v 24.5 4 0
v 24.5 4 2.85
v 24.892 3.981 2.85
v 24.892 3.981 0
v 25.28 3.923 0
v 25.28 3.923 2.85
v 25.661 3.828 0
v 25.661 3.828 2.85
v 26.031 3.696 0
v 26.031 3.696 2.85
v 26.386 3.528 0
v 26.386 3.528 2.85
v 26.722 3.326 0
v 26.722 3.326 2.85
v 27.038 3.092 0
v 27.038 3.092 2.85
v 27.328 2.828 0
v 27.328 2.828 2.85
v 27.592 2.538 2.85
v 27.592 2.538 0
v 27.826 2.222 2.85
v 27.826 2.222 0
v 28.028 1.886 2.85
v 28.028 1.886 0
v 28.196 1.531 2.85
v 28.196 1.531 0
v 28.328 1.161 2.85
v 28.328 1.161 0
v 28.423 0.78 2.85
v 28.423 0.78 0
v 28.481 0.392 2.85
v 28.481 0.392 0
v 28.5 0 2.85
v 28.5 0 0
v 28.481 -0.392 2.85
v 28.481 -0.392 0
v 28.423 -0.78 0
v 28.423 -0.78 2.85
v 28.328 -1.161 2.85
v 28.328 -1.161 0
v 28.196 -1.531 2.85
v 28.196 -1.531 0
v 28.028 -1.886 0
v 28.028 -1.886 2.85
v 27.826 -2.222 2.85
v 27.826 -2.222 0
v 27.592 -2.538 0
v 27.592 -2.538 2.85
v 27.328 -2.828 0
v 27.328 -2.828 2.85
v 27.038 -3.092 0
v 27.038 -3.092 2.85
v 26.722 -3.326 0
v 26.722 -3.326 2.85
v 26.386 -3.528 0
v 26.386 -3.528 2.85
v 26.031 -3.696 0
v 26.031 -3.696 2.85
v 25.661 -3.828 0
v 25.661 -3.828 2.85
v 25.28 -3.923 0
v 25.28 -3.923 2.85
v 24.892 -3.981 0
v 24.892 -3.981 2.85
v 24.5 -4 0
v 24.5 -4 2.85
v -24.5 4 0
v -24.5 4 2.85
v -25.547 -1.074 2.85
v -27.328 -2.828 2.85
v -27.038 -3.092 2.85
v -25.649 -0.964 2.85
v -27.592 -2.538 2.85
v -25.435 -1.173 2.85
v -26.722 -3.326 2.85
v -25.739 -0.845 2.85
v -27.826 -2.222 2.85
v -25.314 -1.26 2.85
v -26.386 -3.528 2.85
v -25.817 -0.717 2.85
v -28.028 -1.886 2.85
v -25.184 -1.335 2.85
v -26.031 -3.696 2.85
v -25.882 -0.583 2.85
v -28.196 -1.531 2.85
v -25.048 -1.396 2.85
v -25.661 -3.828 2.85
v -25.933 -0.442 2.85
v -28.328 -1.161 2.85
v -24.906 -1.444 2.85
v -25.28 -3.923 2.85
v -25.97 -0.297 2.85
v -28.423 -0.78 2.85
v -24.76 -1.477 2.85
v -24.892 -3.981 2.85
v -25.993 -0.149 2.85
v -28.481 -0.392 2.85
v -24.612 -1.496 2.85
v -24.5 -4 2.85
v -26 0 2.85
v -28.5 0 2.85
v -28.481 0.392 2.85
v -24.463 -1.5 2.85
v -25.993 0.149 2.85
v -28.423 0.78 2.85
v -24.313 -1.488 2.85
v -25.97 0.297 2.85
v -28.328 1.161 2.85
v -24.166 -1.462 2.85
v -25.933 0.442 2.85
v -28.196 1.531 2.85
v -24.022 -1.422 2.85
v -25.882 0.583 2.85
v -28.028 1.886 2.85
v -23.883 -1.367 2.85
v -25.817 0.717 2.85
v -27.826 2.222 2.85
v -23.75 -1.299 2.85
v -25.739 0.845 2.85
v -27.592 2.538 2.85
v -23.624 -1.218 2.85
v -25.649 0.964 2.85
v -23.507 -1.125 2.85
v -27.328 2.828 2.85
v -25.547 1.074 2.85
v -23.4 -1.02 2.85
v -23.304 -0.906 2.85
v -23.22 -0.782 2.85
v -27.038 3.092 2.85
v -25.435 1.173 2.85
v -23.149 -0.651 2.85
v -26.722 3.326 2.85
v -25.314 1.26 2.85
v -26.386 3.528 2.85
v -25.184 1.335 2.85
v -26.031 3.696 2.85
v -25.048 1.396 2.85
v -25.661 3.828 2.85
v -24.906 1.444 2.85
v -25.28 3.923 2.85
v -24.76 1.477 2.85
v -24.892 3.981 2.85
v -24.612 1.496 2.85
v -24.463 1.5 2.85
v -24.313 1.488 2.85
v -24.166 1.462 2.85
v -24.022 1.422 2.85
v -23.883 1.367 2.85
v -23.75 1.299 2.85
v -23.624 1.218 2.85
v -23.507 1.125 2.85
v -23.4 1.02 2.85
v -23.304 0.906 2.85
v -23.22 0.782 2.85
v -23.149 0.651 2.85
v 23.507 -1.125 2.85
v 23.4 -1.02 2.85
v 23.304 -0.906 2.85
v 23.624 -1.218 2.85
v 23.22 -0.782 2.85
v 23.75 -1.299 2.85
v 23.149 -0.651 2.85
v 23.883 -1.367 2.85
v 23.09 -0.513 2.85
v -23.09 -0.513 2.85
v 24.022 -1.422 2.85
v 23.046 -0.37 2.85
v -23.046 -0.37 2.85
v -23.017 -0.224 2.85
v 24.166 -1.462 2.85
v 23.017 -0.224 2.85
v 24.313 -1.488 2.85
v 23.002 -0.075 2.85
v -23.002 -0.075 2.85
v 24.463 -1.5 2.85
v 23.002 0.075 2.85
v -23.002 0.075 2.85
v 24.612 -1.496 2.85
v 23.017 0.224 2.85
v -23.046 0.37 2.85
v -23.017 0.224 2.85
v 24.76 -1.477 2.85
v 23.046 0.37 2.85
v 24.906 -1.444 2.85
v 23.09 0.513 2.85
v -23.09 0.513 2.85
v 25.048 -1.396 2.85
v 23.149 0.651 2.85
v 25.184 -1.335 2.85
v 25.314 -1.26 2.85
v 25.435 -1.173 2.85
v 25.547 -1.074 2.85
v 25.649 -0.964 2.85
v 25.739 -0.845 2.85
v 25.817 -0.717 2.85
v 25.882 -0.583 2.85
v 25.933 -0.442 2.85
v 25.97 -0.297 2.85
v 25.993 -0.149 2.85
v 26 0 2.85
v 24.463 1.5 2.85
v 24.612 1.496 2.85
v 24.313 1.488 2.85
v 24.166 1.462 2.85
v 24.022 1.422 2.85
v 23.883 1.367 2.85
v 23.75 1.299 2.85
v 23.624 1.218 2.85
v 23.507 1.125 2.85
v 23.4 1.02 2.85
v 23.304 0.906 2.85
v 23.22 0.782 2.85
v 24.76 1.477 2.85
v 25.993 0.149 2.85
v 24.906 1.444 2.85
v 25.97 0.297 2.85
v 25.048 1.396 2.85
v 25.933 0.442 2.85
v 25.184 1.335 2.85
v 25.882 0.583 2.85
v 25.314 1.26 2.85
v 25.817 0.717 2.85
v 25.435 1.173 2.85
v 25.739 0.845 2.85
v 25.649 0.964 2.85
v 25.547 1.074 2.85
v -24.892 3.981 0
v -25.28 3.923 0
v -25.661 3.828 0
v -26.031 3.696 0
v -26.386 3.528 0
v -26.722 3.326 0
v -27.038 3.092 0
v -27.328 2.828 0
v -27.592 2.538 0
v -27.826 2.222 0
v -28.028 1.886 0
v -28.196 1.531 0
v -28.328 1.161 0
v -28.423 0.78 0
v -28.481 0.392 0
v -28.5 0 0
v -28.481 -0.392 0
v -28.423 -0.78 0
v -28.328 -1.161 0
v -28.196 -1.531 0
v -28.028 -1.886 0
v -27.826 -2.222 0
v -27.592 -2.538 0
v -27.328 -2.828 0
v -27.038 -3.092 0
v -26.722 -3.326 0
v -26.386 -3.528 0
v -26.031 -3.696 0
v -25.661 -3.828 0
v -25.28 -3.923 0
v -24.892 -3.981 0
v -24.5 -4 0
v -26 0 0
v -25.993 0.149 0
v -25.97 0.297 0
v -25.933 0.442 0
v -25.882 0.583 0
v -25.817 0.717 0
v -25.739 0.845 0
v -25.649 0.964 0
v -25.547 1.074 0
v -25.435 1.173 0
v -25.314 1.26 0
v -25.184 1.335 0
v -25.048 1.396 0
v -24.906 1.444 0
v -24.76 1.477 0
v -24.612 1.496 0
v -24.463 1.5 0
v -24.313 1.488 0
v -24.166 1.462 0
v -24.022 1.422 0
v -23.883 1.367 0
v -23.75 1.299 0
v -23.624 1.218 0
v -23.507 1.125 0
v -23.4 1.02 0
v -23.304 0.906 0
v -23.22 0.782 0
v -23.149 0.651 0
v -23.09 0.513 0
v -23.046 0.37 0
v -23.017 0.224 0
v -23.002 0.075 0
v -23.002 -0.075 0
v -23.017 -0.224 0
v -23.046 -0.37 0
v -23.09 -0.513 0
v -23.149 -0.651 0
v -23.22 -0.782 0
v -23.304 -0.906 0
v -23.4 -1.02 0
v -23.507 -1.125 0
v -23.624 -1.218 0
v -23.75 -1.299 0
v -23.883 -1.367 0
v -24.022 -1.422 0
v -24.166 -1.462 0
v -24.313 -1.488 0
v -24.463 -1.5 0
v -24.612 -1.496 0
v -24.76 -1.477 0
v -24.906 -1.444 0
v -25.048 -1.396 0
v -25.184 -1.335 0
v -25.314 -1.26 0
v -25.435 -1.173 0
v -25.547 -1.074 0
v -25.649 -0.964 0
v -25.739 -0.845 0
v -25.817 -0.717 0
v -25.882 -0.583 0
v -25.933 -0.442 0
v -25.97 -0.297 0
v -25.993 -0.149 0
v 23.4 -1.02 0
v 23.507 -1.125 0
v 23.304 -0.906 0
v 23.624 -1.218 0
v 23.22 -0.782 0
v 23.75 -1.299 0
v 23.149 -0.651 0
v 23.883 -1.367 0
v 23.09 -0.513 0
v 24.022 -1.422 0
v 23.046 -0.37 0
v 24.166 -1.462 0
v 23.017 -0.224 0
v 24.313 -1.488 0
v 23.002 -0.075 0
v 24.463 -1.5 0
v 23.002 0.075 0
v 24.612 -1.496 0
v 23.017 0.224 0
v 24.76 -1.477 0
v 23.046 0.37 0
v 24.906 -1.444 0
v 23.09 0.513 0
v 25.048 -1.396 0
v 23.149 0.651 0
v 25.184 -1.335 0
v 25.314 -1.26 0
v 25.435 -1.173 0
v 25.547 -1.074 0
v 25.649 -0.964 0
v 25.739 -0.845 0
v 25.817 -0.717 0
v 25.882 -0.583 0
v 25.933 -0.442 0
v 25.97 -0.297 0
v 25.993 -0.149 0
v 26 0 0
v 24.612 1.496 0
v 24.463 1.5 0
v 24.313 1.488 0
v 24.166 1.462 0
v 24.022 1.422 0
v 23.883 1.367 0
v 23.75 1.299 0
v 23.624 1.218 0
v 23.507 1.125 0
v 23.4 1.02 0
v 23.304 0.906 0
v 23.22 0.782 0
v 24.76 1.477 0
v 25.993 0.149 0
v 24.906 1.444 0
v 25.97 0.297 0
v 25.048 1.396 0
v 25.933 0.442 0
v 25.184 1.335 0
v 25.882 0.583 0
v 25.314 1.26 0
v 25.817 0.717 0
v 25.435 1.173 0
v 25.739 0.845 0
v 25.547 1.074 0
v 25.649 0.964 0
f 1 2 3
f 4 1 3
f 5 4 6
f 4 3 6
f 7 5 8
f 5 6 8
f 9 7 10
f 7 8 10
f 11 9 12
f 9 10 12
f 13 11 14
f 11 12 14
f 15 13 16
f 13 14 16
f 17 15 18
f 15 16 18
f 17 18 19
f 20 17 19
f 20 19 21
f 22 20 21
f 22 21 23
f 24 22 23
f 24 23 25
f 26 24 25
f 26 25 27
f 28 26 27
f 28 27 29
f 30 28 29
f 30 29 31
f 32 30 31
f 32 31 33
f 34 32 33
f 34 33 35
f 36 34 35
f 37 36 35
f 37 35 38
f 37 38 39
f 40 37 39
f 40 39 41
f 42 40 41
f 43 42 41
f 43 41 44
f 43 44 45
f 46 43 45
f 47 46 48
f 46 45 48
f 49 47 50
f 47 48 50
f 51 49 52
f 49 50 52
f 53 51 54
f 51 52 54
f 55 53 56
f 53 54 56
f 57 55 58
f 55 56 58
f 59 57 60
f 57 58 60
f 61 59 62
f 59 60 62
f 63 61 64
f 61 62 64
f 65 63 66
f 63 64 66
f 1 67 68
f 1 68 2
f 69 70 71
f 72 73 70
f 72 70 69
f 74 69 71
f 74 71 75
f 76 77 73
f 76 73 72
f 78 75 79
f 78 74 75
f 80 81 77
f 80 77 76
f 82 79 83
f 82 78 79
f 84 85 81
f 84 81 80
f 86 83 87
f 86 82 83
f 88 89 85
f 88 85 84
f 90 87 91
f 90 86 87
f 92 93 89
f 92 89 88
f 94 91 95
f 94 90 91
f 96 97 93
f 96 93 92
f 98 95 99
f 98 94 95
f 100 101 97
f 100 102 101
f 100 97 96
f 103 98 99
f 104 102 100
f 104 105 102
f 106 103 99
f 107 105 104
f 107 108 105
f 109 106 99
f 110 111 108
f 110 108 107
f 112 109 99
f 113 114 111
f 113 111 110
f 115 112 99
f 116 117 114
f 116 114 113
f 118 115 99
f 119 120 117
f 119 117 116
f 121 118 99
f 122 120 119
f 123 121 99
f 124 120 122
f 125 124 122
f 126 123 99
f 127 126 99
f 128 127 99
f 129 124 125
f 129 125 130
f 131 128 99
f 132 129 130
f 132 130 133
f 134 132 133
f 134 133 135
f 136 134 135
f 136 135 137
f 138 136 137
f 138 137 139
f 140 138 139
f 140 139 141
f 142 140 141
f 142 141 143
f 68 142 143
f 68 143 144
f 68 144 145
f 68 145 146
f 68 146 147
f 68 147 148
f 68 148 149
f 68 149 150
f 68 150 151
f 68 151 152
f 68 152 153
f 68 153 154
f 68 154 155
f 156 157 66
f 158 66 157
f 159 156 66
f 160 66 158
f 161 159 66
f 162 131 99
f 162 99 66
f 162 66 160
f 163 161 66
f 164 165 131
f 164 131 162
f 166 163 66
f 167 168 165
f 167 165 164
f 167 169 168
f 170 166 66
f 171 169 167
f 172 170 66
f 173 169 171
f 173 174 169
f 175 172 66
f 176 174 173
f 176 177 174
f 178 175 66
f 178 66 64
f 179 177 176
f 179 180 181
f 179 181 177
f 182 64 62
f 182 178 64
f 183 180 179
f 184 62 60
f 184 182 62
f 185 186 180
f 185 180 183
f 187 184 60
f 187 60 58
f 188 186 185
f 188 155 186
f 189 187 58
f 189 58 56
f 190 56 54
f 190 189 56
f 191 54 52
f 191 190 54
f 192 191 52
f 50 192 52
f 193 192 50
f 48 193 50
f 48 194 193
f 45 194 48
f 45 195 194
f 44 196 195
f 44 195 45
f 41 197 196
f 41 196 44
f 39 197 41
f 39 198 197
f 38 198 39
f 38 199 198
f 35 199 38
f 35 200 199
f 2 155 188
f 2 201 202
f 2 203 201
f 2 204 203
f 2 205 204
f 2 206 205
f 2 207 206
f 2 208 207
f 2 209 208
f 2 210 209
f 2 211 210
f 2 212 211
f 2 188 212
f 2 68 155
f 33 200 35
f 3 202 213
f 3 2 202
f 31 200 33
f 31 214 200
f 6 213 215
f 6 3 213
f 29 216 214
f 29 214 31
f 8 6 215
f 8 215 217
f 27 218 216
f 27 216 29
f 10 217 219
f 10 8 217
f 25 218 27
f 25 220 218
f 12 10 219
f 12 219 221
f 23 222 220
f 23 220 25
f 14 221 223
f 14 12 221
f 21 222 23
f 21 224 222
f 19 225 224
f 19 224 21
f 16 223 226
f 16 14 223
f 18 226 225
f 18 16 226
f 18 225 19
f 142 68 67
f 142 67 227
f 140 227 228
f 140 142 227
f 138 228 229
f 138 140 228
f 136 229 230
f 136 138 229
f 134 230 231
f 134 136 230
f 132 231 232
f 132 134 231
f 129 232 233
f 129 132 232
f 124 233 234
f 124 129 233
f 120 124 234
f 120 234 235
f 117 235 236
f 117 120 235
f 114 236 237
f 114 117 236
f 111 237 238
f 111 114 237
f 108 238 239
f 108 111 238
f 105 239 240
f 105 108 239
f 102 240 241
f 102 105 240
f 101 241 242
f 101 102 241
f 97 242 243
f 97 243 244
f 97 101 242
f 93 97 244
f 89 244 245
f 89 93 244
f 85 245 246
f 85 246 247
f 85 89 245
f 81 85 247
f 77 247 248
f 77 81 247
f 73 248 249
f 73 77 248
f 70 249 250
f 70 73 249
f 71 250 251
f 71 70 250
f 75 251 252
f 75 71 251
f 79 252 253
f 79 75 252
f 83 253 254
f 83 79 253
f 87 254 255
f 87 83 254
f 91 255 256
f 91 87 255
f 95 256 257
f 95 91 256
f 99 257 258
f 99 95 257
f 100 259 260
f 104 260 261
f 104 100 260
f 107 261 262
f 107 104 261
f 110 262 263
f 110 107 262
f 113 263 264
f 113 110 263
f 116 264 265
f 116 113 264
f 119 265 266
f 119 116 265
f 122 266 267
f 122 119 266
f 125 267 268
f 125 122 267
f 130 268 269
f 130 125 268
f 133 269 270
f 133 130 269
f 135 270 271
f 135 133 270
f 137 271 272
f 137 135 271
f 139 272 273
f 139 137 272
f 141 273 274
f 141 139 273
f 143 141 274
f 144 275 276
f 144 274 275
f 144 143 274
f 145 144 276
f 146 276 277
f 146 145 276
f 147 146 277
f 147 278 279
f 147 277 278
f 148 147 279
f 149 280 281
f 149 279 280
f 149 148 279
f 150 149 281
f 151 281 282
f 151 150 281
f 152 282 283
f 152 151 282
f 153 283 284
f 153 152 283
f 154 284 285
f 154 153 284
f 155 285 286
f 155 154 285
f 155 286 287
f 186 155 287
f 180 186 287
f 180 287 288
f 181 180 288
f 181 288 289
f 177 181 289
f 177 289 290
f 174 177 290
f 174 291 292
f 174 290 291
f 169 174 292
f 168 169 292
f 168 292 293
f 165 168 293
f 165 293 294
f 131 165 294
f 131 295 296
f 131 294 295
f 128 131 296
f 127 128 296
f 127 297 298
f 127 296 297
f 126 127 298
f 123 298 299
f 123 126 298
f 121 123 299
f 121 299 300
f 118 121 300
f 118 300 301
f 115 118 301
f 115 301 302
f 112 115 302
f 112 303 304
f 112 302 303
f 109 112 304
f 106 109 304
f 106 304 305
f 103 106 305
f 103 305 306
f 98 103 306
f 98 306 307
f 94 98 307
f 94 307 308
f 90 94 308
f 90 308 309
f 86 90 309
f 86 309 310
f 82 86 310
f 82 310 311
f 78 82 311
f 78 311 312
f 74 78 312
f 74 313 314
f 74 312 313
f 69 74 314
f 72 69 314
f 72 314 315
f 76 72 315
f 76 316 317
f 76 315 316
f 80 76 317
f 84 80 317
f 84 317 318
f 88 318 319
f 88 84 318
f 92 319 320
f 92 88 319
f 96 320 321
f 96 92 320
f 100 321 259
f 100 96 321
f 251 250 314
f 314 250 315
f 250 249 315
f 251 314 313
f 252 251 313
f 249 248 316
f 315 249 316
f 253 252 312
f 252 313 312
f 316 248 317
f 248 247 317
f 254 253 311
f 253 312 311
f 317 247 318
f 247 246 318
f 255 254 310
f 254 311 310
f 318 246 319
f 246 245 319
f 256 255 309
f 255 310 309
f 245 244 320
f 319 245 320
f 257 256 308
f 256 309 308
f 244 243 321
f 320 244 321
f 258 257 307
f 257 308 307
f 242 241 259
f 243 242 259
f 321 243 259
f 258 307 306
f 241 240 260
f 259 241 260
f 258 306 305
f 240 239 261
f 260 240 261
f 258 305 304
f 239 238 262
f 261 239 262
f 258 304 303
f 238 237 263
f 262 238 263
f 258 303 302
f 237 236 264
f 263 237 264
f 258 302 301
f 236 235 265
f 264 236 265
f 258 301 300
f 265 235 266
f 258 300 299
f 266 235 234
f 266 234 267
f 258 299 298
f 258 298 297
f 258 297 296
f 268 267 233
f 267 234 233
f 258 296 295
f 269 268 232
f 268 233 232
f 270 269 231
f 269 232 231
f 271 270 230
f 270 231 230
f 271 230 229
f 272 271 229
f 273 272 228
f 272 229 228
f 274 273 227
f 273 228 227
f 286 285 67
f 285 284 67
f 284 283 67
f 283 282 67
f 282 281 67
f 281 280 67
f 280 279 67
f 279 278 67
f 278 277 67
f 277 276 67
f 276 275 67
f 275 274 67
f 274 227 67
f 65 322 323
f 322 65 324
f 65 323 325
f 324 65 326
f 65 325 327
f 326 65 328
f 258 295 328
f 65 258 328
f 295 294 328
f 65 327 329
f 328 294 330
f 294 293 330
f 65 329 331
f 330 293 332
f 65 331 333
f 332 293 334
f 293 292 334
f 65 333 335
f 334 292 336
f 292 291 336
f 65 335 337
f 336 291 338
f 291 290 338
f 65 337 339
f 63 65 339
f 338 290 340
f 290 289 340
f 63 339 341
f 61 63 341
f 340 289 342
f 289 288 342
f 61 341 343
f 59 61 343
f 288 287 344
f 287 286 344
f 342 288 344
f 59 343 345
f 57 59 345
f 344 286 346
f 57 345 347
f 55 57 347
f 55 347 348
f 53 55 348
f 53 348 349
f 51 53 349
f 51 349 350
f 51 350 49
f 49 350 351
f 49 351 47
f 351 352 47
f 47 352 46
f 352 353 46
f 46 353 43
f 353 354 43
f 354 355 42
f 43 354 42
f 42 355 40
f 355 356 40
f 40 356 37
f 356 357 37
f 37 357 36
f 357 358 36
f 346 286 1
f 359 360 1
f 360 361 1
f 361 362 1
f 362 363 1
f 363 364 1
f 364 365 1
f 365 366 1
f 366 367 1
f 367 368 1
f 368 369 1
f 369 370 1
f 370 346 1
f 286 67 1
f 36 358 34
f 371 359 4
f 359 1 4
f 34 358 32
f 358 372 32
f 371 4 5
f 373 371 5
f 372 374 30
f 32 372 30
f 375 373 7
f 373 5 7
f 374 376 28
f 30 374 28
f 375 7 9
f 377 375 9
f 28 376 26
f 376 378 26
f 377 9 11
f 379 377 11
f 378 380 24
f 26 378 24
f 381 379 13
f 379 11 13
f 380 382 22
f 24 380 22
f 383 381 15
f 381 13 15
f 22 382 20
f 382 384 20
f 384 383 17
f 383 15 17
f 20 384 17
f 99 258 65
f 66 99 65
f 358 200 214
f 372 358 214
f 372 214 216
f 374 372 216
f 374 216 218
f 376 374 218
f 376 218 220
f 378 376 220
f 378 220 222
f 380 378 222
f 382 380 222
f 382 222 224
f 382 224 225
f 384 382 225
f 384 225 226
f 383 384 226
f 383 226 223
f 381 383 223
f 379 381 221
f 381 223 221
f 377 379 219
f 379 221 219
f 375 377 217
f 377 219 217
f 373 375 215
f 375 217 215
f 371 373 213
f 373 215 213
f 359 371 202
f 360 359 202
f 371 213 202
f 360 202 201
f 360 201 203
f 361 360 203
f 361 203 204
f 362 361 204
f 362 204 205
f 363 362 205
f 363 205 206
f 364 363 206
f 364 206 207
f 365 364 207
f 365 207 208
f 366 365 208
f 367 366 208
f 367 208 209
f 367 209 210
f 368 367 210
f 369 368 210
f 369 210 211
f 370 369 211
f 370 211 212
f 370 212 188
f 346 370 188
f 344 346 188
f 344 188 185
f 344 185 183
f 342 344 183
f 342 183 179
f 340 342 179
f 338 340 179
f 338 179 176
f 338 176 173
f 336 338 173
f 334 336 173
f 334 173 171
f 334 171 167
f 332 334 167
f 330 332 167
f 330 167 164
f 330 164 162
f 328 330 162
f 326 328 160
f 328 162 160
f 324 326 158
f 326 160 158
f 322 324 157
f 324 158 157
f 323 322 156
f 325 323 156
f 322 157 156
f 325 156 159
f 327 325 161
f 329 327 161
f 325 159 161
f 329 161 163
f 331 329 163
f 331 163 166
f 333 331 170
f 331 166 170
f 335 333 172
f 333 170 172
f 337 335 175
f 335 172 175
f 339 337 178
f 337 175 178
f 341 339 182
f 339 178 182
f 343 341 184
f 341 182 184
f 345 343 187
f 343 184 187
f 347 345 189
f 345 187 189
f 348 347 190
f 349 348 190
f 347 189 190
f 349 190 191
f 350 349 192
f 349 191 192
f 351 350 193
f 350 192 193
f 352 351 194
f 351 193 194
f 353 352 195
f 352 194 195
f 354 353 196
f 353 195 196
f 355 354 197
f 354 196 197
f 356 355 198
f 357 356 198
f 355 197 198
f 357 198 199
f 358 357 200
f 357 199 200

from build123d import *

# Parameters (mm, degrees)
SKETCH1_W           = 57
SKETCH1_H           = 8
BOSS_EXTRUDE1_DEPTH = 2.85
CUT_EXTRUDE1_DEPTH  = 29.920105463
SKETCH3_R           = 1.5
CUT_EXTRUDE2_DEPTH  = 29.920105463


with BuildPart() as part:
    # Sketch1 → Boss-Extrude1 (new body)
    with BuildSketch(Plane.XY):
        Rectangle(SKETCH1_W, SKETCH1_H)
    extrude(amount=BOSS_EXTRUDE1_DEPTH)

    # Sketch2 → Cut-Extrude1 (cut, through all)
    with BuildSketch(Plane.XY.offset(2.85)):
        with BuildLine():
            Line((24.5, -4), (29.5, -4))
            Line((29.5, -4), (29.5, 4))
            Line((29.5, 4), (24.5, 4))
            ThreePointArc((24.5, 4), (28.5, 0), (24.5, -4))
        make_face()
    cut_extrude1 = extrude(amount=-CUT_EXTRUDE1_DEPTH, mode=Mode.SUBTRACT)

    # Sketch3 → Cut-Extrude2 (cut, through all)
    with BuildSketch(Plane.XY.offset(2.85)):
        with Locations((24.5, 0)):
            Circle(SKETCH3_R)
    cut_extrude2 = extrude(amount=-CUT_EXTRUDE2_DEPTH, mode=Mode.SUBTRACT)

    # Mirror1: Cut-Extrude1, Cut-Extrude2 across plane
    add(cut_extrude1.mirror(Plane(origin=(0, 0, 0), x_dir=(0, 0, 1), z_dir=(1, 0, 0))), mode=Mode.SUBTRACT)
    add(cut_extrude2.mirror(Plane(origin=(0, 0, 0), x_dir=(0, 0, 1), z_dir=(1, 0, 0))), mode=Mode.SUBTRACT)


solid = part.part
